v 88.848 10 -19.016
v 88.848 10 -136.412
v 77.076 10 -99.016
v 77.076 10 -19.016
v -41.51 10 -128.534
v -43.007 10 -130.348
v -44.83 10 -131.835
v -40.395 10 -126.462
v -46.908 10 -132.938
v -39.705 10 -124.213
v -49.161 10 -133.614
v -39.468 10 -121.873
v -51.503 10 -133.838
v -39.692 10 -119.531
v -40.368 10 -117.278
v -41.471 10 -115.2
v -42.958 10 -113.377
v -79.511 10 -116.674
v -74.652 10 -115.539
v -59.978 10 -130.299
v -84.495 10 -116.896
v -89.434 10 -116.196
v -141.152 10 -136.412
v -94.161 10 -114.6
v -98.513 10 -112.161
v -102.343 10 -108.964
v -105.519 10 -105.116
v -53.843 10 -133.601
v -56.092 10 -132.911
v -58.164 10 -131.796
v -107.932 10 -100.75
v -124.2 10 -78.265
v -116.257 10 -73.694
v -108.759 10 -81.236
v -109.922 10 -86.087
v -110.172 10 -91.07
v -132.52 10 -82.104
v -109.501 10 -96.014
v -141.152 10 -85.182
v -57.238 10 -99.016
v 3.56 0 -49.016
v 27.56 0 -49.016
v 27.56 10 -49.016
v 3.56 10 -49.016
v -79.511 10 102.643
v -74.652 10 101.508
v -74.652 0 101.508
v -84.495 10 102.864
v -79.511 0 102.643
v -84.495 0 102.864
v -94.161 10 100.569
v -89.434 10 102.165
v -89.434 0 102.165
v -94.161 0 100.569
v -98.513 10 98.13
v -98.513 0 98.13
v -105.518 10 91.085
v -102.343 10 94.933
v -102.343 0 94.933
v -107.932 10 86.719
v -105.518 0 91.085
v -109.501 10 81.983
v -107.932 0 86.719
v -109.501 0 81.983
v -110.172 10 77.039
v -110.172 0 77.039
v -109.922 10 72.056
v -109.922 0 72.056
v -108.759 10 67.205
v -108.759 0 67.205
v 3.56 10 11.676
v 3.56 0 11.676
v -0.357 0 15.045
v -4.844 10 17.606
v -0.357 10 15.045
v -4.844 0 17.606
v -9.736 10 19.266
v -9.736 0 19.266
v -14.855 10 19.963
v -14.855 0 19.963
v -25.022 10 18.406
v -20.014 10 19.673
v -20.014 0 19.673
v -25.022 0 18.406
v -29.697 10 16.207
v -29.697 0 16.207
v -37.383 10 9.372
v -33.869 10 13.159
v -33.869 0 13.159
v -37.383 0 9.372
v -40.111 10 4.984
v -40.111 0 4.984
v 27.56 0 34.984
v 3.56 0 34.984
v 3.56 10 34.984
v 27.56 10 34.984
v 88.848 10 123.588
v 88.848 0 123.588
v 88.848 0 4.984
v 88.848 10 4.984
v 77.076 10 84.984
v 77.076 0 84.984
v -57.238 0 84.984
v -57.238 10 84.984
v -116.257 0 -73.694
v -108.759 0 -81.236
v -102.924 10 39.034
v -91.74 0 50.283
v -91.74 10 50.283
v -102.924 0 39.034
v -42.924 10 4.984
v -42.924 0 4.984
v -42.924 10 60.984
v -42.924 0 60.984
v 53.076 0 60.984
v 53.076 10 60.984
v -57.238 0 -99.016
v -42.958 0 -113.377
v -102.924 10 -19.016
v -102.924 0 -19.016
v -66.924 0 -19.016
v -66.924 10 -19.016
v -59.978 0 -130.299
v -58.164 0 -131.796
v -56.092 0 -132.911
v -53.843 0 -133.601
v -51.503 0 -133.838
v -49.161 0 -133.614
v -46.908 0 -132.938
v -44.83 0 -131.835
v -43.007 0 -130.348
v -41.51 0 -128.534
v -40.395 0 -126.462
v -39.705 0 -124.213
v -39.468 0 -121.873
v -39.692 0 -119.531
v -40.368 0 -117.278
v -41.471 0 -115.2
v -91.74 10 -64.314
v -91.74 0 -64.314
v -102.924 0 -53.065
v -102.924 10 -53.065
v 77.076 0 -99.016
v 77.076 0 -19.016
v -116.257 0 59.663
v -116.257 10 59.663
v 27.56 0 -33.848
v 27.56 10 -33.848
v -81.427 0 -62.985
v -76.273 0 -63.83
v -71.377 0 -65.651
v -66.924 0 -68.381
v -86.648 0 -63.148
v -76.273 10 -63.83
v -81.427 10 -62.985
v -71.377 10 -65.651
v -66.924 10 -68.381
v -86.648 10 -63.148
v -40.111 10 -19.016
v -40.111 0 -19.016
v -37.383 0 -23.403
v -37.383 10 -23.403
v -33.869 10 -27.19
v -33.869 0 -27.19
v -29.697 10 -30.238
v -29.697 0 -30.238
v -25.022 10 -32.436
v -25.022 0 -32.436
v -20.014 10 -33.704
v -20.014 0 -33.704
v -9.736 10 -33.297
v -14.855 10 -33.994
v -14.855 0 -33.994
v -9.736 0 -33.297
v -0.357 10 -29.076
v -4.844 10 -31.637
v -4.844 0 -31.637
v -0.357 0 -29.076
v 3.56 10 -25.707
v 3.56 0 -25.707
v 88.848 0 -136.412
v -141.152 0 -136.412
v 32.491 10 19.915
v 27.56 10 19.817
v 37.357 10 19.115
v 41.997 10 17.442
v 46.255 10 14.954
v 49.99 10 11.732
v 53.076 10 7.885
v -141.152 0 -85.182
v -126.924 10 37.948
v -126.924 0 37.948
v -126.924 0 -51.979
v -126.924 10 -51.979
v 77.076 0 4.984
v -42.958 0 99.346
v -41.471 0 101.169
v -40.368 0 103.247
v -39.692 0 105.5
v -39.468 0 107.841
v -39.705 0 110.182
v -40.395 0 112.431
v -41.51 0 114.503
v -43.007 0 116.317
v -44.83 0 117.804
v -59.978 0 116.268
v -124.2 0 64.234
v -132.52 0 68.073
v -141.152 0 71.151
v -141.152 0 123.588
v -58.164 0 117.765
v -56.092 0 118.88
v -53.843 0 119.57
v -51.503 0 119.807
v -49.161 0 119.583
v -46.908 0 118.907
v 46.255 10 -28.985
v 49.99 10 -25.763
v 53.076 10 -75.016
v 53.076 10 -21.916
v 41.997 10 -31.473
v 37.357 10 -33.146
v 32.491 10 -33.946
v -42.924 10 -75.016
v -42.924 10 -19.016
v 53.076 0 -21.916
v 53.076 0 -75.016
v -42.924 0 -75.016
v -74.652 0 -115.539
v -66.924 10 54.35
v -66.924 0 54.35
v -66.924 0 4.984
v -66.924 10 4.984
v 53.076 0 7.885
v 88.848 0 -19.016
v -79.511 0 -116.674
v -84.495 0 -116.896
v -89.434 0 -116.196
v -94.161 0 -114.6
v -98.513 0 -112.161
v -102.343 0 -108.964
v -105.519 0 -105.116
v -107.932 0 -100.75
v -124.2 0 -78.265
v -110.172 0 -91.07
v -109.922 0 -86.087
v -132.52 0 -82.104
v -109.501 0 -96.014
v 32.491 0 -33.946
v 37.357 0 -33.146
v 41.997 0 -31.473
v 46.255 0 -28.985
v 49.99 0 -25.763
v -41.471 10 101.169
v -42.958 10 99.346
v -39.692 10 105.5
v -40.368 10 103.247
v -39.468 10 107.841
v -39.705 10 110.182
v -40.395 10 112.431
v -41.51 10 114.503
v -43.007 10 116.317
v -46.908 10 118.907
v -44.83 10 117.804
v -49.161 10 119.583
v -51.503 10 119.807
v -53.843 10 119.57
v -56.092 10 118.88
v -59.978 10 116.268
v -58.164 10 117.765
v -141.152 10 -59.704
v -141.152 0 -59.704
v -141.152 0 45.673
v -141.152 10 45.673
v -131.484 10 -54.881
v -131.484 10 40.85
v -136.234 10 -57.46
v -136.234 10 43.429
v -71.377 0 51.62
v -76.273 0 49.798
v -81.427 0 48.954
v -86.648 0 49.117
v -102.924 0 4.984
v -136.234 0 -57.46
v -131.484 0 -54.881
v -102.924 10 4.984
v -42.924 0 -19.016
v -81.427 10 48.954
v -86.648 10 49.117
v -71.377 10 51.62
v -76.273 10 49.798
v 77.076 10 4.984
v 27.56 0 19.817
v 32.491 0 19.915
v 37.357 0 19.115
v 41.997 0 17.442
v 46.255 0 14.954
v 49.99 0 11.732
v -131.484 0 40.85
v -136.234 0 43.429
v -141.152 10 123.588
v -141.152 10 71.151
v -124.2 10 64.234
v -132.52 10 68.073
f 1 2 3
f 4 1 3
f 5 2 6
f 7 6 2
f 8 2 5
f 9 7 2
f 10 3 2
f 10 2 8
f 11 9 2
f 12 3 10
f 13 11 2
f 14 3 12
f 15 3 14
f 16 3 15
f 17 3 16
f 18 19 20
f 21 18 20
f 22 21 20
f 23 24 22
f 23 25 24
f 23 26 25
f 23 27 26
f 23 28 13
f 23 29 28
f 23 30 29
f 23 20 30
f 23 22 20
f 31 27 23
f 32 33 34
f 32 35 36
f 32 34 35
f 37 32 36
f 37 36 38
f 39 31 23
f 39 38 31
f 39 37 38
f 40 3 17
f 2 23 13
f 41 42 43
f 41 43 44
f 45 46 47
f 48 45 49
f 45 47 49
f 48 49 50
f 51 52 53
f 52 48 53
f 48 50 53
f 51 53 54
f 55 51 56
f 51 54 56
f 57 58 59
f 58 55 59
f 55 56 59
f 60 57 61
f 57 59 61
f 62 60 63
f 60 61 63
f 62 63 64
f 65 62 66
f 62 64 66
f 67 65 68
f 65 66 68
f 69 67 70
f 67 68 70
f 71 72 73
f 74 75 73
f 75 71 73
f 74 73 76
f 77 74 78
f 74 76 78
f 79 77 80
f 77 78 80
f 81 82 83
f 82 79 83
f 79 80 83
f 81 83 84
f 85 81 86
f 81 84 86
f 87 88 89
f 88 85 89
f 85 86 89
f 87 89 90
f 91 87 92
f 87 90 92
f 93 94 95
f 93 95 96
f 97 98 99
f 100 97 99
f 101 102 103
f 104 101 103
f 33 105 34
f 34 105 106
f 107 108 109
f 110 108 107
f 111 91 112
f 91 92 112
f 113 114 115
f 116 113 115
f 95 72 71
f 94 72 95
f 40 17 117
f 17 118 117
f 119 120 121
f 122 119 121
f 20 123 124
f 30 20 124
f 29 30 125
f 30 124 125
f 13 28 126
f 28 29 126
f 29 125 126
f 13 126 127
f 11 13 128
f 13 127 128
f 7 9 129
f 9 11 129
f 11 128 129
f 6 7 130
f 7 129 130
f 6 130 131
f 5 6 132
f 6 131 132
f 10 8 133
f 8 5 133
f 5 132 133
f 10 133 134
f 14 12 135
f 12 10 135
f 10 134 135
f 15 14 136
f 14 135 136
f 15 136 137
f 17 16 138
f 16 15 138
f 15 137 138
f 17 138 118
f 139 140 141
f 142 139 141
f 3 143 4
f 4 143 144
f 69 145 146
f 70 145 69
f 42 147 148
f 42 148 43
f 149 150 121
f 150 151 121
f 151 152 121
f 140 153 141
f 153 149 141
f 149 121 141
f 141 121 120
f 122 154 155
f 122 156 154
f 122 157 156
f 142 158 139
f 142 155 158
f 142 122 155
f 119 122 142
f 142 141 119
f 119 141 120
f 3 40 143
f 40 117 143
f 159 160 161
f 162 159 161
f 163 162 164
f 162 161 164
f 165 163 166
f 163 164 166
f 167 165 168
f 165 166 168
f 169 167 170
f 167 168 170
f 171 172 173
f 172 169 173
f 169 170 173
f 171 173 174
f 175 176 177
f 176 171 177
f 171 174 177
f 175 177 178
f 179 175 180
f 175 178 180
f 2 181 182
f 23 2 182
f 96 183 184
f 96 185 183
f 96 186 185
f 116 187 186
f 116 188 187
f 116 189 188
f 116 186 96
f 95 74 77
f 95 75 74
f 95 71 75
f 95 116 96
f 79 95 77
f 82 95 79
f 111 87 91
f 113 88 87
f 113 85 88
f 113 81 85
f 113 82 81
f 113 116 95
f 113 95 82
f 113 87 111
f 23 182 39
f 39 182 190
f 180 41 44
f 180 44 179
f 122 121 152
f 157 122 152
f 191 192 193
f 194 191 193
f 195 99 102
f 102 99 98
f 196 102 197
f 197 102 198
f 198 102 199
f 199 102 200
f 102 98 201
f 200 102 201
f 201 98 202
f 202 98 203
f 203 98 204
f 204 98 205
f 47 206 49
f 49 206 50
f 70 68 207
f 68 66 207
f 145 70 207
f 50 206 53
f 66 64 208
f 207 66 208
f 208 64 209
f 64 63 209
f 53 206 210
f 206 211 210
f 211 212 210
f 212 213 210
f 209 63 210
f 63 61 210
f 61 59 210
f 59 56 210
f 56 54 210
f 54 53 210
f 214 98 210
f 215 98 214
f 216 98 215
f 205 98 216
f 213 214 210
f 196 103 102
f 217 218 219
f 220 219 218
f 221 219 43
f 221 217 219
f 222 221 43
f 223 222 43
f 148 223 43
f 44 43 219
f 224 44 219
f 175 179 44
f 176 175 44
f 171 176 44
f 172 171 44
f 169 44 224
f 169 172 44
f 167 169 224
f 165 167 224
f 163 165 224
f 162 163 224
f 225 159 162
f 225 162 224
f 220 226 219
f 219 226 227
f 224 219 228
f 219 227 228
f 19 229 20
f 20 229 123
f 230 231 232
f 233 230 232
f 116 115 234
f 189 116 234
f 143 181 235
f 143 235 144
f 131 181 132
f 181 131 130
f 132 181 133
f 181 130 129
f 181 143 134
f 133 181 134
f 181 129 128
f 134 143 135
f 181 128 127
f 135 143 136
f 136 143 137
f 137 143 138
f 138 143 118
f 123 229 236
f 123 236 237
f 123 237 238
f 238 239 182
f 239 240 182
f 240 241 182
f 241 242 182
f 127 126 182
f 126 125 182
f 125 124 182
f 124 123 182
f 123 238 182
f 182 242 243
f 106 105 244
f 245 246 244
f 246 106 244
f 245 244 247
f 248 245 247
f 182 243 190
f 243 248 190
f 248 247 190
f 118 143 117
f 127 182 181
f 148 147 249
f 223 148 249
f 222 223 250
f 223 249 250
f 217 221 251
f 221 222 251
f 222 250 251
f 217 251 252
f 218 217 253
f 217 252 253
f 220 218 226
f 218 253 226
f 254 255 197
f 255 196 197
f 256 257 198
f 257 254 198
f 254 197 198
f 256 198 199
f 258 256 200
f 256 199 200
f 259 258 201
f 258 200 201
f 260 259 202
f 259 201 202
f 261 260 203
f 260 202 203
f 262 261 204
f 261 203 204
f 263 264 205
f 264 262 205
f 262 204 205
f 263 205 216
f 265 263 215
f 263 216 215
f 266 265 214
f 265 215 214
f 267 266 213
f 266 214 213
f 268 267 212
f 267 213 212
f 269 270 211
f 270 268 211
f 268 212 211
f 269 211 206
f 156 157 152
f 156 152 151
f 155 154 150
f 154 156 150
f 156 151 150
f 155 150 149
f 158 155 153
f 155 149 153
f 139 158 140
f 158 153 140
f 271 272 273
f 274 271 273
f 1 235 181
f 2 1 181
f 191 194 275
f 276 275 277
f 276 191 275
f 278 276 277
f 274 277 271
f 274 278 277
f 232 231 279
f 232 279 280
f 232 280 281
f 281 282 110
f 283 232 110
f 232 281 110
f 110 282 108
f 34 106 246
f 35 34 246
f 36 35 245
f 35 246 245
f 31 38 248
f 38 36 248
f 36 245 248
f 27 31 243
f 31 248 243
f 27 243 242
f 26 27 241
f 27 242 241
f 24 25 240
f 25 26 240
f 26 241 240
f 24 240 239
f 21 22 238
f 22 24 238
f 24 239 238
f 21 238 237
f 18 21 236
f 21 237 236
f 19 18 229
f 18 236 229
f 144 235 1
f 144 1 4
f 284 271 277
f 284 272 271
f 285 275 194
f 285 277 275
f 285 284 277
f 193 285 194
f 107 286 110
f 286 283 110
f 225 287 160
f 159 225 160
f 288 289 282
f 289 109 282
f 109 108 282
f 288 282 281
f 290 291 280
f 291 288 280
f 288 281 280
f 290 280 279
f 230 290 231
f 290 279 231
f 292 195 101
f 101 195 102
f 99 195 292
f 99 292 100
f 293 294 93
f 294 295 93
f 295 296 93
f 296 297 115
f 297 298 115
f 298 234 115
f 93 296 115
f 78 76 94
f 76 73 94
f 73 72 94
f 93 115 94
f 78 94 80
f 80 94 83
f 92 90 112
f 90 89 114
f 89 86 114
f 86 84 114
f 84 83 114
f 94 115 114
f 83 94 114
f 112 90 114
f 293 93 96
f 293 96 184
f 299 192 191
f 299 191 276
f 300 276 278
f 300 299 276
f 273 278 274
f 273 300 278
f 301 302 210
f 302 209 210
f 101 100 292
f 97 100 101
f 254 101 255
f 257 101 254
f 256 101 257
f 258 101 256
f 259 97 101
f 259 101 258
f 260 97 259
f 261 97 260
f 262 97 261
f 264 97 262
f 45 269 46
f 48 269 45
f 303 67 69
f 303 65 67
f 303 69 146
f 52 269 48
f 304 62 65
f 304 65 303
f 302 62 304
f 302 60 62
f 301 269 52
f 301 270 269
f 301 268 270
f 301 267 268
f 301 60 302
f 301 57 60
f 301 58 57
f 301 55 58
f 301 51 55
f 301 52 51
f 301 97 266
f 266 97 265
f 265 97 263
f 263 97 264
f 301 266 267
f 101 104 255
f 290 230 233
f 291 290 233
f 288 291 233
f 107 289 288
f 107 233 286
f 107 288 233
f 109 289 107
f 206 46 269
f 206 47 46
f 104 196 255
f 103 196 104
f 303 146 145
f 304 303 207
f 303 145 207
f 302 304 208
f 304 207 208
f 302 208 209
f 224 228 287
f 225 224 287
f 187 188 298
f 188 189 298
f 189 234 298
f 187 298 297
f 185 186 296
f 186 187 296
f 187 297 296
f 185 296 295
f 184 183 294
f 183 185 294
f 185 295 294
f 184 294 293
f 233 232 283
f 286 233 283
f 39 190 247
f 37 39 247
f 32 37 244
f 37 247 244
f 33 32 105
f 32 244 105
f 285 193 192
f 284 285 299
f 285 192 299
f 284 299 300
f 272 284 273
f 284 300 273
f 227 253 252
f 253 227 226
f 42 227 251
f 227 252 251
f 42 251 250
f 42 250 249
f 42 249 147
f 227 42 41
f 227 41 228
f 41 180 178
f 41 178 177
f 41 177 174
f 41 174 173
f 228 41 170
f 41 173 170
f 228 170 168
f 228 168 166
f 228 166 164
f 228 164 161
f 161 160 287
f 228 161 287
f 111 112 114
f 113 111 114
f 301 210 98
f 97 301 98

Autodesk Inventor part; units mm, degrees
ref_plane "YZ Plane" through (0, 0, 0) normal (1, 0, 0) x (0, 1, 0)
ref_plane "XZ Plane" through (0, 0, 0) normal (0, 1, 0) x (-1, 0, 0)
ref_plane "XY Plane" through (0, 0, 0) normal (0, 0, 1) x (1, 0, 0)
sketch "Boceto1" plane through (0, 0, 0) normal (0, 1, 0) x (-1, 0, 0)
  line L0 (-88.8483, 123.588) -> (-88.8483, -136.412)
  line L1 (-88.8483, -136.412) -> (141.1517, -136.412)
  line L2 (141.1517, -136.412) -> (141.1517, 123.588)
  line L3 (141.1517, 123.588) -> (-88.8483, 123.588)
  circle A0 centre (51.468, -121.838) radius 4
  circle A1 centre (51.468, 107.8069) radius 4
  line L4 (66.9242, 84.9845) -> (66.9242, 4.9845)
  line L5 (66.9242, 4.9845) -> (102.9242, 4.9845)
  line L6 (102.9242, 4.9845) -> (102.9242, 54.9845)
  line L7 (126.9242, 54.9845) -> (126.9242, -69.0155)
  line L8 (126.9242, -69.0155) -> (102.9242, -69.0155)
  line L9 (102.9242, -69.0155) -> (102.9242, -19.0155)
  line L10 (102.9242, -19.0155) -> (66.9242, -19.0155)
  line L11 (-77.0758, -99.0155) -> (-77.0758, 84.9845)
  line L12 (-77.0758, 84.9845) -> (66.9242, 84.9845)
  line L13 (-53.0758, -75.0155) -> (42.9242, -75.0155)
  line L14 (42.9242, -75.0155) -> (42.9242, -19.0155)
  line L15 (42.9242, -19.0155) -> (40.111, -19.0155)
  arc A2 (-8.2625, -19.0155) -> (40.111, -19.0155) centre (15.9242, -7.0155) ccw
  line L16 (-8.2625, -19.0155) -> (-53.0758, -19.0155)
  line L17 (-53.0758, -19.0155) -> (-53.0758, -75.0155)
  circle A3 centre (-15.5598, -41.0155) radius 4
  line L18 (42.9242, 60.9845) -> (-53.0758, 60.9845)
  line L19 (-53.0758, 60.9845) -> (-53.0758, 4.9845)
  line L20 (-53.0758, 4.9845) -> (-8.2625, 4.9845)
  arc A4 (40.111, 4.9845) -> (-8.2625, 4.9845) centre (15.9242, -7.0155) ccw
  line L21 (40.111, 4.9845) -> (42.9242, 4.9845)
  line L22 (42.9242, 4.9845) -> (42.9242, 60.9845)
  circle A5 centre (-15.5598, 26.9845) radius 4
  line L23 (-25.5598, -31.5104) -> (-25.5598, -47.0155)
  line L24 (-25.5598, -47.0155) -> (-5.5598, -47.0155)
  line L25 (-5.5598, -47.0155) -> (-5.5598, 32.9845)
  line L26 (-5.5598, 32.9845) -> (-25.5598, 32.9845)
  line L27 (-25.5598, 32.9845) -> (-25.5598, 17.4794)
  arc A6 (-25.5598, 17.4794) -> (-53.4727, 2.9845) centre (-30.5598, -7.0155) ccw
  line L28 (-53.4727, 2.9845) -> (-195.5598, 2.9845)
  line L29 (-195.5598, 2.9845) -> (-195.5598, -17.0155)
  line L30 (-195.5598, -17.0155) -> (-53.4727, -17.0155)
  arc A7 (-53.4727, -17.0155) -> (-25.5598, -31.5104) centre (-30.5598, -7.0155) ccw
  circle A8 centre (-15.5598, 26.9845) radius 4
  circle A9 centre (-15.5598, -41.0155) radius 4
  line L31 (107.8328, -50.9648) -> (92.2599, -66.6277)
  arc A10 (92.2599, -66.6277) -> (59.9496, -99.1245) centre (83.1961, -89.9268) ccw
  line L32 (59.9496, -99.1245) -> (44.3766, -114.7873)
  arc A11 (44.3766, -114.7873) -> (58.5594, -128.8887) centre (51.468, -121.838) ccw
  line L33 (58.5594, -128.8887) -> (74.1323, -113.2259)
  arc A12 (74.1323, -113.2259) -> (106.4427, -80.7291) centre (83.1961, -89.9268) ccw
  line L34 (106.4427, -80.7291) -> (115.9835, -71.1332)
  arc A13 (115.9835, -71.1332) -> (219.4033, -75.1979) centre (171.0539, 12.3369) ccw
  arc A14 (219.4033, -75.1979) -> (209.7334, -57.6909) centre (214.5684, -66.4444) ccw
  arc A15 (121.1609, -50.1986) -> (209.7334, -57.6909) centre (171.0539, 12.3369) ccw
  arc A16 (121.1609, -50.1986) -> (107.8328, -50.9648) centre (114.9242, -58.0155) ccw
  circle A17 centre (51.468, -121.838) radius 4
  circle A18 centre (114.9242, -58.0155) radius 4
  line L35 (107.8328, 36.9338) -> (92.2599, 52.5966)
  arc A19 (107.8328, 36.9338) -> (121.1609, 36.1675) centre (114.9242, 43.9845) ccw
  arc A20 (209.7334, 43.6599) -> (121.1609, 36.1675) centre (171.0539, -26.3679) ccw
  arc A21 (209.7334, 43.6599) -> (219.4033, 61.1668) centre (214.5684, 52.4133) ccw
  arc A22 (219.4033, 61.1668) -> (115.9835, 57.1021) centre (171.0539, -26.3679) ccw
  line L36 (106.4427, 66.698) -> (115.9835, 57.1021)
  arc A23 (106.4427, 66.698) -> (74.1323, 99.1948) centre (83.1961, 75.8957) ccw
  line L37 (58.5594, 114.8576) -> (74.1323, 99.1948)
  arc A24 (58.5594, 114.8576) -> (44.3766, 100.7562) centre (51.468, 107.8069) ccw
  line L38 (59.9496, 85.0934) -> (44.3766, 100.7562)
  arc A25 (59.9496, 85.0934) -> (92.2599, 52.5966) centre (83.1961, 75.8957) ccw
  circle A26 centre (51.468, 107.8069) radius 4
  circle A27 centre (114.9242, 43.9845) radius 4
  line L39 (-27.5598, -33.8483) -> (-27.5598, -49.0155)
  line L40 (-27.5598, -49.0155) -> (-3.5598, -49.0155)
  line L41 (-3.5598, -49.0155) -> (-3.5598, -25.707)
  line L42 (-3.5598, 34.9845) -> (-27.5598, 34.9845)
  line L43 (-27.5598, 34.9845) -> (-27.5598, 19.8173)
  arc A28 (-27.5598, 19.8173) -> (-53.0758, 7.8852) centre (-30.5598, -7.0155) ccw
  arc A29 (74.6524, -115.5394) -> (108.7591, -81.2358) centre (83.1961, -89.9268) ccw
  line L44 (74.6524, -115.5394) -> (59.9777, -130.2988)
  arc A30 (42.9583, -113.3772) -> (59.9777, -130.2988) centre (51.468, -121.838) ccw
  line L45 (42.9583, -113.3772) -> (57.6331, -98.6177)
  arc A31 (91.7398, -64.3142) -> (57.6331, -98.6177) centre (83.1961, -89.9268) ccw
  line L46 (91.7398, -64.3142) -> (106.4146, -49.5547)
  arc A32 (122.4082, -48.6352) -> (106.4146, -49.5547) centre (114.9242, -58.0155) ccw
  arc A33 (122.4082, -48.6352) -> (208.7664, -55.9402) centre (171.0539, 12.3369) ccw
  arc A34 (220.3703, -76.9486) -> (208.7664, -55.9402) centre (214.5684, -66.4444) ccw
  arc A35 (116.2574, -73.6942) -> (220.3703, -76.9486) centre (171.0539, 12.3369) ccw
  line L47 (116.2574, -73.6942) -> (108.7591, -81.2358)
  line L48 (91.7398, 50.2831) -> (106.4146, 35.5236)
  arc A36 (106.4146, 35.5236) -> (122.4082, 34.6041) centre (114.9242, 43.9845) ccw
  line L49 (116.2574, 59.6632) -> (108.7591, 67.2048)
  arc A37 (108.7591, 67.2048) -> (74.6524, 101.5083) centre (83.1961, 75.8957) ccw
  line L50 (74.6524, 101.5083) -> (59.9777, 116.2678)
  arc A38 (59.9777, 116.2678) -> (42.9583, 99.3461) centre (51.468, 107.8069) ccw
  line L51 (42.9583, 99.3461) -> (57.2376, 84.9845)
  line L52 (102.9242, -19.0155) -> (66.9242, -19.0155)
  circle A39 centre (-65.0758, -87.0155) radius 4
  circle A40 centre (-65.0758, 72.9845) radius 4
  line L53 (104.9242, -67.0155) -> (124.9242, -67.0155)
  line L54 (124.9242, -67.0155) -> (124.9242, 52.9845)
  line L55 (124.9242, 52.9845) -> (104.9242, 52.9845)
  line L56 (104.9242, 52.9845) -> (104.9242, 2.9845)
  line L57 (104.9242, 2.9845) -> (64.9242, 2.9845)
  line L58 (64.9242, 2.9845) -> (64.9242, 82.9845)
  line L59 (64.9242, 82.9845) -> (-75.0758, 82.9845)
  line L60 (-75.0758, 82.9845) -> (-75.0758, -97.0155)
  line L61 (-75.0758, -97.0155) -> (64.9242, -97.0155)
  line L62 (64.9242, -97.0155) -> (64.9242, -17.0155)
  line L63 (64.9242, -17.0155) -> (104.9242, -17.0155)
  line L64 (104.9242, -17.0155) -> (104.9242, -67.0155)
  circle A41 centre (114.9242, -58.0155) radius 4
  circle A42 centre (114.9242, 43.9845) radius 4
  line L65 (44.9242, -17.0155) -> (44.9242, -77.0155)
  line L66 (44.9242, -77.0155) -> (-55.0758, -77.0155)
  line L67 (-55.0758, -77.0155) -> (-55.0758, -17.0155)
  line L68 (-55.0758, -17.0155) -> (-6.9887, -17.0155)
  arc A43 (-6.9887, -17.0155) -> (38.8371, -17.0155) centre (15.9242, -7.0155) ccw
  line L69 (38.8371, -17.0155) -> (44.9242, -17.0155)
  line L70 (44.9242, 2.9845) -> (38.8371, 2.9845)
  arc A44 (38.8371, 2.9845) -> (-6.9887, 2.9845) centre (15.9242, -7.0155) ccw
  line L71 (-6.9887, 2.9845) -> (-55.0758, 2.9845)
  line L72 (-55.0758, 2.9845) -> (-55.0758, 62.9845)
  line L73 (-55.0758, 62.9845) -> (44.9242, 62.9845)
  line L74 (44.9242, 62.9845) -> (44.9242, 2.9845)
  line L75 (102.9242, -19.0155) -> (66.9242, -19.0155)
  line L76 (66.9242, -19.0155) -> (66.9242, -68.3809)
  line L77 (-77.0758, -99.0155) -> (-77.0758, 84.9845)
  line L78 (-77.0758, 84.9845) -> (66.9242, 84.9845)
  line L79 (66.9242, 84.9845) -> (66.9242, 4.9845)
  line L80 (66.9242, 4.9845) -> (102.9242, 4.9845)
  line L81 (102.9242, 4.9845) -> (102.9242, 39.0341)
  line L82 (102.9242, -53.0652) -> (102.9242, -19.0155)
  arc A45 (141.1517, 71.1506) -> (116.2574, 59.6632) centre (171.0539, -26.3679) ccw
  arc A46 (141.1517, 45.6727) -> (122.4082, 34.6041) centre (171.0539, -26.3679) ccw
  line L83 (141.1517, 123.588) -> (-88.8483, 123.588)
  line L84 (-88.8483, 123.588) -> (-88.8483, -136.412)
  line L85 (-88.8483, -136.412) -> (141.1517, -136.412)
  line L86 (141.1517, -136.412) -> (141.1517, -85.1816)
  line L87 (126.9242, 37.9483) -> (126.9242, -51.9793)
  arc A47 (66.9242, 54.3498) -> (91.7398, 50.2831) centre (83.1961, 75.8957) ccw
  line L88 (42.9242, 4.9845) -> (40.111, 4.9845)
  arc A48 (40.111, 4.9845) -> (-3.5598, 11.676) centre (15.9242, -7.0155) ccw
  line L89 (-53.0758, 60.9845) -> (42.9242, 60.9845)
  line L90 (42.9242, 60.9845) -> (42.9242, 4.9845)
  line L91 (42.9242, -75.0155) -> (42.9242, -19.0155)
  line L92 (42.9242, -19.0155) -> (40.111, -19.0155)
  line L93 (-53.0758, -75.0155) -> (42.9242, -75.0155)
  line L94 (-3.5598, 11.676) -> (-3.5598, 34.9845)
  line L95 (-53.0758, 7.8852) -> (-53.0758, 60.9845)
  line L96 (-53.0758, -21.9163) -> (-53.0758, -75.0155)
  arc A49 (-3.5598, -25.707) -> (40.111, -19.0155) centre (15.9242, -7.0155) ccw
  arc A50 (-53.0758, -21.9163) -> (-27.5598, -33.8483) centre (-30.5598, -7.0155) ccw
  line L97 (-77.0758, 4.9845) -> (-88.8483, 4.9845)
  line L98 (-88.8483, -19.0155) -> (-77.0758, -19.0155)
  line L99 (57.2376, -99.0155) -> (-77.0758, -99.0155)
  line L100 (57.7718, -99.0155) -> (57.2376, -99.0155)
  line L101 (141.1517, -59.7038) -> (141.1517, 123.588)
  line L102 (141.1517, -85.1816) -> (141.1517, -59.7038)
  point P0 (0, 0)
  point P1 (102.9242, 39.0341)
  point P2 (126.9242, 37.9483)
  point P3 (126.9242, -51.9793)
  point P4 (141.1517, -59.7038)
  point P5 (102.9242, -53.0652)
  point P6 (141.1517, -85.1816)
extrude "Extrusión1" add sketch "Boceto1" along normal blind 10 contours L3 L2 A45 L49 A37 L50 A38 L51 L12 L11 L97 L0 | L98 L11 L99 L45 A30 L44 A29 L47 A35 L2 L1 L0 | L2 A33 L7 A46 | A47 L48 L6 L5 L4 | L76 L10 L9 L46 A31 | L19 L18 L22 L21 A4 L94 L42 L43 A28 | A50 L39 L40 L41 A2 L15 L14 L13 L17
properties part number "ParteFinalMesaEnsamble"
